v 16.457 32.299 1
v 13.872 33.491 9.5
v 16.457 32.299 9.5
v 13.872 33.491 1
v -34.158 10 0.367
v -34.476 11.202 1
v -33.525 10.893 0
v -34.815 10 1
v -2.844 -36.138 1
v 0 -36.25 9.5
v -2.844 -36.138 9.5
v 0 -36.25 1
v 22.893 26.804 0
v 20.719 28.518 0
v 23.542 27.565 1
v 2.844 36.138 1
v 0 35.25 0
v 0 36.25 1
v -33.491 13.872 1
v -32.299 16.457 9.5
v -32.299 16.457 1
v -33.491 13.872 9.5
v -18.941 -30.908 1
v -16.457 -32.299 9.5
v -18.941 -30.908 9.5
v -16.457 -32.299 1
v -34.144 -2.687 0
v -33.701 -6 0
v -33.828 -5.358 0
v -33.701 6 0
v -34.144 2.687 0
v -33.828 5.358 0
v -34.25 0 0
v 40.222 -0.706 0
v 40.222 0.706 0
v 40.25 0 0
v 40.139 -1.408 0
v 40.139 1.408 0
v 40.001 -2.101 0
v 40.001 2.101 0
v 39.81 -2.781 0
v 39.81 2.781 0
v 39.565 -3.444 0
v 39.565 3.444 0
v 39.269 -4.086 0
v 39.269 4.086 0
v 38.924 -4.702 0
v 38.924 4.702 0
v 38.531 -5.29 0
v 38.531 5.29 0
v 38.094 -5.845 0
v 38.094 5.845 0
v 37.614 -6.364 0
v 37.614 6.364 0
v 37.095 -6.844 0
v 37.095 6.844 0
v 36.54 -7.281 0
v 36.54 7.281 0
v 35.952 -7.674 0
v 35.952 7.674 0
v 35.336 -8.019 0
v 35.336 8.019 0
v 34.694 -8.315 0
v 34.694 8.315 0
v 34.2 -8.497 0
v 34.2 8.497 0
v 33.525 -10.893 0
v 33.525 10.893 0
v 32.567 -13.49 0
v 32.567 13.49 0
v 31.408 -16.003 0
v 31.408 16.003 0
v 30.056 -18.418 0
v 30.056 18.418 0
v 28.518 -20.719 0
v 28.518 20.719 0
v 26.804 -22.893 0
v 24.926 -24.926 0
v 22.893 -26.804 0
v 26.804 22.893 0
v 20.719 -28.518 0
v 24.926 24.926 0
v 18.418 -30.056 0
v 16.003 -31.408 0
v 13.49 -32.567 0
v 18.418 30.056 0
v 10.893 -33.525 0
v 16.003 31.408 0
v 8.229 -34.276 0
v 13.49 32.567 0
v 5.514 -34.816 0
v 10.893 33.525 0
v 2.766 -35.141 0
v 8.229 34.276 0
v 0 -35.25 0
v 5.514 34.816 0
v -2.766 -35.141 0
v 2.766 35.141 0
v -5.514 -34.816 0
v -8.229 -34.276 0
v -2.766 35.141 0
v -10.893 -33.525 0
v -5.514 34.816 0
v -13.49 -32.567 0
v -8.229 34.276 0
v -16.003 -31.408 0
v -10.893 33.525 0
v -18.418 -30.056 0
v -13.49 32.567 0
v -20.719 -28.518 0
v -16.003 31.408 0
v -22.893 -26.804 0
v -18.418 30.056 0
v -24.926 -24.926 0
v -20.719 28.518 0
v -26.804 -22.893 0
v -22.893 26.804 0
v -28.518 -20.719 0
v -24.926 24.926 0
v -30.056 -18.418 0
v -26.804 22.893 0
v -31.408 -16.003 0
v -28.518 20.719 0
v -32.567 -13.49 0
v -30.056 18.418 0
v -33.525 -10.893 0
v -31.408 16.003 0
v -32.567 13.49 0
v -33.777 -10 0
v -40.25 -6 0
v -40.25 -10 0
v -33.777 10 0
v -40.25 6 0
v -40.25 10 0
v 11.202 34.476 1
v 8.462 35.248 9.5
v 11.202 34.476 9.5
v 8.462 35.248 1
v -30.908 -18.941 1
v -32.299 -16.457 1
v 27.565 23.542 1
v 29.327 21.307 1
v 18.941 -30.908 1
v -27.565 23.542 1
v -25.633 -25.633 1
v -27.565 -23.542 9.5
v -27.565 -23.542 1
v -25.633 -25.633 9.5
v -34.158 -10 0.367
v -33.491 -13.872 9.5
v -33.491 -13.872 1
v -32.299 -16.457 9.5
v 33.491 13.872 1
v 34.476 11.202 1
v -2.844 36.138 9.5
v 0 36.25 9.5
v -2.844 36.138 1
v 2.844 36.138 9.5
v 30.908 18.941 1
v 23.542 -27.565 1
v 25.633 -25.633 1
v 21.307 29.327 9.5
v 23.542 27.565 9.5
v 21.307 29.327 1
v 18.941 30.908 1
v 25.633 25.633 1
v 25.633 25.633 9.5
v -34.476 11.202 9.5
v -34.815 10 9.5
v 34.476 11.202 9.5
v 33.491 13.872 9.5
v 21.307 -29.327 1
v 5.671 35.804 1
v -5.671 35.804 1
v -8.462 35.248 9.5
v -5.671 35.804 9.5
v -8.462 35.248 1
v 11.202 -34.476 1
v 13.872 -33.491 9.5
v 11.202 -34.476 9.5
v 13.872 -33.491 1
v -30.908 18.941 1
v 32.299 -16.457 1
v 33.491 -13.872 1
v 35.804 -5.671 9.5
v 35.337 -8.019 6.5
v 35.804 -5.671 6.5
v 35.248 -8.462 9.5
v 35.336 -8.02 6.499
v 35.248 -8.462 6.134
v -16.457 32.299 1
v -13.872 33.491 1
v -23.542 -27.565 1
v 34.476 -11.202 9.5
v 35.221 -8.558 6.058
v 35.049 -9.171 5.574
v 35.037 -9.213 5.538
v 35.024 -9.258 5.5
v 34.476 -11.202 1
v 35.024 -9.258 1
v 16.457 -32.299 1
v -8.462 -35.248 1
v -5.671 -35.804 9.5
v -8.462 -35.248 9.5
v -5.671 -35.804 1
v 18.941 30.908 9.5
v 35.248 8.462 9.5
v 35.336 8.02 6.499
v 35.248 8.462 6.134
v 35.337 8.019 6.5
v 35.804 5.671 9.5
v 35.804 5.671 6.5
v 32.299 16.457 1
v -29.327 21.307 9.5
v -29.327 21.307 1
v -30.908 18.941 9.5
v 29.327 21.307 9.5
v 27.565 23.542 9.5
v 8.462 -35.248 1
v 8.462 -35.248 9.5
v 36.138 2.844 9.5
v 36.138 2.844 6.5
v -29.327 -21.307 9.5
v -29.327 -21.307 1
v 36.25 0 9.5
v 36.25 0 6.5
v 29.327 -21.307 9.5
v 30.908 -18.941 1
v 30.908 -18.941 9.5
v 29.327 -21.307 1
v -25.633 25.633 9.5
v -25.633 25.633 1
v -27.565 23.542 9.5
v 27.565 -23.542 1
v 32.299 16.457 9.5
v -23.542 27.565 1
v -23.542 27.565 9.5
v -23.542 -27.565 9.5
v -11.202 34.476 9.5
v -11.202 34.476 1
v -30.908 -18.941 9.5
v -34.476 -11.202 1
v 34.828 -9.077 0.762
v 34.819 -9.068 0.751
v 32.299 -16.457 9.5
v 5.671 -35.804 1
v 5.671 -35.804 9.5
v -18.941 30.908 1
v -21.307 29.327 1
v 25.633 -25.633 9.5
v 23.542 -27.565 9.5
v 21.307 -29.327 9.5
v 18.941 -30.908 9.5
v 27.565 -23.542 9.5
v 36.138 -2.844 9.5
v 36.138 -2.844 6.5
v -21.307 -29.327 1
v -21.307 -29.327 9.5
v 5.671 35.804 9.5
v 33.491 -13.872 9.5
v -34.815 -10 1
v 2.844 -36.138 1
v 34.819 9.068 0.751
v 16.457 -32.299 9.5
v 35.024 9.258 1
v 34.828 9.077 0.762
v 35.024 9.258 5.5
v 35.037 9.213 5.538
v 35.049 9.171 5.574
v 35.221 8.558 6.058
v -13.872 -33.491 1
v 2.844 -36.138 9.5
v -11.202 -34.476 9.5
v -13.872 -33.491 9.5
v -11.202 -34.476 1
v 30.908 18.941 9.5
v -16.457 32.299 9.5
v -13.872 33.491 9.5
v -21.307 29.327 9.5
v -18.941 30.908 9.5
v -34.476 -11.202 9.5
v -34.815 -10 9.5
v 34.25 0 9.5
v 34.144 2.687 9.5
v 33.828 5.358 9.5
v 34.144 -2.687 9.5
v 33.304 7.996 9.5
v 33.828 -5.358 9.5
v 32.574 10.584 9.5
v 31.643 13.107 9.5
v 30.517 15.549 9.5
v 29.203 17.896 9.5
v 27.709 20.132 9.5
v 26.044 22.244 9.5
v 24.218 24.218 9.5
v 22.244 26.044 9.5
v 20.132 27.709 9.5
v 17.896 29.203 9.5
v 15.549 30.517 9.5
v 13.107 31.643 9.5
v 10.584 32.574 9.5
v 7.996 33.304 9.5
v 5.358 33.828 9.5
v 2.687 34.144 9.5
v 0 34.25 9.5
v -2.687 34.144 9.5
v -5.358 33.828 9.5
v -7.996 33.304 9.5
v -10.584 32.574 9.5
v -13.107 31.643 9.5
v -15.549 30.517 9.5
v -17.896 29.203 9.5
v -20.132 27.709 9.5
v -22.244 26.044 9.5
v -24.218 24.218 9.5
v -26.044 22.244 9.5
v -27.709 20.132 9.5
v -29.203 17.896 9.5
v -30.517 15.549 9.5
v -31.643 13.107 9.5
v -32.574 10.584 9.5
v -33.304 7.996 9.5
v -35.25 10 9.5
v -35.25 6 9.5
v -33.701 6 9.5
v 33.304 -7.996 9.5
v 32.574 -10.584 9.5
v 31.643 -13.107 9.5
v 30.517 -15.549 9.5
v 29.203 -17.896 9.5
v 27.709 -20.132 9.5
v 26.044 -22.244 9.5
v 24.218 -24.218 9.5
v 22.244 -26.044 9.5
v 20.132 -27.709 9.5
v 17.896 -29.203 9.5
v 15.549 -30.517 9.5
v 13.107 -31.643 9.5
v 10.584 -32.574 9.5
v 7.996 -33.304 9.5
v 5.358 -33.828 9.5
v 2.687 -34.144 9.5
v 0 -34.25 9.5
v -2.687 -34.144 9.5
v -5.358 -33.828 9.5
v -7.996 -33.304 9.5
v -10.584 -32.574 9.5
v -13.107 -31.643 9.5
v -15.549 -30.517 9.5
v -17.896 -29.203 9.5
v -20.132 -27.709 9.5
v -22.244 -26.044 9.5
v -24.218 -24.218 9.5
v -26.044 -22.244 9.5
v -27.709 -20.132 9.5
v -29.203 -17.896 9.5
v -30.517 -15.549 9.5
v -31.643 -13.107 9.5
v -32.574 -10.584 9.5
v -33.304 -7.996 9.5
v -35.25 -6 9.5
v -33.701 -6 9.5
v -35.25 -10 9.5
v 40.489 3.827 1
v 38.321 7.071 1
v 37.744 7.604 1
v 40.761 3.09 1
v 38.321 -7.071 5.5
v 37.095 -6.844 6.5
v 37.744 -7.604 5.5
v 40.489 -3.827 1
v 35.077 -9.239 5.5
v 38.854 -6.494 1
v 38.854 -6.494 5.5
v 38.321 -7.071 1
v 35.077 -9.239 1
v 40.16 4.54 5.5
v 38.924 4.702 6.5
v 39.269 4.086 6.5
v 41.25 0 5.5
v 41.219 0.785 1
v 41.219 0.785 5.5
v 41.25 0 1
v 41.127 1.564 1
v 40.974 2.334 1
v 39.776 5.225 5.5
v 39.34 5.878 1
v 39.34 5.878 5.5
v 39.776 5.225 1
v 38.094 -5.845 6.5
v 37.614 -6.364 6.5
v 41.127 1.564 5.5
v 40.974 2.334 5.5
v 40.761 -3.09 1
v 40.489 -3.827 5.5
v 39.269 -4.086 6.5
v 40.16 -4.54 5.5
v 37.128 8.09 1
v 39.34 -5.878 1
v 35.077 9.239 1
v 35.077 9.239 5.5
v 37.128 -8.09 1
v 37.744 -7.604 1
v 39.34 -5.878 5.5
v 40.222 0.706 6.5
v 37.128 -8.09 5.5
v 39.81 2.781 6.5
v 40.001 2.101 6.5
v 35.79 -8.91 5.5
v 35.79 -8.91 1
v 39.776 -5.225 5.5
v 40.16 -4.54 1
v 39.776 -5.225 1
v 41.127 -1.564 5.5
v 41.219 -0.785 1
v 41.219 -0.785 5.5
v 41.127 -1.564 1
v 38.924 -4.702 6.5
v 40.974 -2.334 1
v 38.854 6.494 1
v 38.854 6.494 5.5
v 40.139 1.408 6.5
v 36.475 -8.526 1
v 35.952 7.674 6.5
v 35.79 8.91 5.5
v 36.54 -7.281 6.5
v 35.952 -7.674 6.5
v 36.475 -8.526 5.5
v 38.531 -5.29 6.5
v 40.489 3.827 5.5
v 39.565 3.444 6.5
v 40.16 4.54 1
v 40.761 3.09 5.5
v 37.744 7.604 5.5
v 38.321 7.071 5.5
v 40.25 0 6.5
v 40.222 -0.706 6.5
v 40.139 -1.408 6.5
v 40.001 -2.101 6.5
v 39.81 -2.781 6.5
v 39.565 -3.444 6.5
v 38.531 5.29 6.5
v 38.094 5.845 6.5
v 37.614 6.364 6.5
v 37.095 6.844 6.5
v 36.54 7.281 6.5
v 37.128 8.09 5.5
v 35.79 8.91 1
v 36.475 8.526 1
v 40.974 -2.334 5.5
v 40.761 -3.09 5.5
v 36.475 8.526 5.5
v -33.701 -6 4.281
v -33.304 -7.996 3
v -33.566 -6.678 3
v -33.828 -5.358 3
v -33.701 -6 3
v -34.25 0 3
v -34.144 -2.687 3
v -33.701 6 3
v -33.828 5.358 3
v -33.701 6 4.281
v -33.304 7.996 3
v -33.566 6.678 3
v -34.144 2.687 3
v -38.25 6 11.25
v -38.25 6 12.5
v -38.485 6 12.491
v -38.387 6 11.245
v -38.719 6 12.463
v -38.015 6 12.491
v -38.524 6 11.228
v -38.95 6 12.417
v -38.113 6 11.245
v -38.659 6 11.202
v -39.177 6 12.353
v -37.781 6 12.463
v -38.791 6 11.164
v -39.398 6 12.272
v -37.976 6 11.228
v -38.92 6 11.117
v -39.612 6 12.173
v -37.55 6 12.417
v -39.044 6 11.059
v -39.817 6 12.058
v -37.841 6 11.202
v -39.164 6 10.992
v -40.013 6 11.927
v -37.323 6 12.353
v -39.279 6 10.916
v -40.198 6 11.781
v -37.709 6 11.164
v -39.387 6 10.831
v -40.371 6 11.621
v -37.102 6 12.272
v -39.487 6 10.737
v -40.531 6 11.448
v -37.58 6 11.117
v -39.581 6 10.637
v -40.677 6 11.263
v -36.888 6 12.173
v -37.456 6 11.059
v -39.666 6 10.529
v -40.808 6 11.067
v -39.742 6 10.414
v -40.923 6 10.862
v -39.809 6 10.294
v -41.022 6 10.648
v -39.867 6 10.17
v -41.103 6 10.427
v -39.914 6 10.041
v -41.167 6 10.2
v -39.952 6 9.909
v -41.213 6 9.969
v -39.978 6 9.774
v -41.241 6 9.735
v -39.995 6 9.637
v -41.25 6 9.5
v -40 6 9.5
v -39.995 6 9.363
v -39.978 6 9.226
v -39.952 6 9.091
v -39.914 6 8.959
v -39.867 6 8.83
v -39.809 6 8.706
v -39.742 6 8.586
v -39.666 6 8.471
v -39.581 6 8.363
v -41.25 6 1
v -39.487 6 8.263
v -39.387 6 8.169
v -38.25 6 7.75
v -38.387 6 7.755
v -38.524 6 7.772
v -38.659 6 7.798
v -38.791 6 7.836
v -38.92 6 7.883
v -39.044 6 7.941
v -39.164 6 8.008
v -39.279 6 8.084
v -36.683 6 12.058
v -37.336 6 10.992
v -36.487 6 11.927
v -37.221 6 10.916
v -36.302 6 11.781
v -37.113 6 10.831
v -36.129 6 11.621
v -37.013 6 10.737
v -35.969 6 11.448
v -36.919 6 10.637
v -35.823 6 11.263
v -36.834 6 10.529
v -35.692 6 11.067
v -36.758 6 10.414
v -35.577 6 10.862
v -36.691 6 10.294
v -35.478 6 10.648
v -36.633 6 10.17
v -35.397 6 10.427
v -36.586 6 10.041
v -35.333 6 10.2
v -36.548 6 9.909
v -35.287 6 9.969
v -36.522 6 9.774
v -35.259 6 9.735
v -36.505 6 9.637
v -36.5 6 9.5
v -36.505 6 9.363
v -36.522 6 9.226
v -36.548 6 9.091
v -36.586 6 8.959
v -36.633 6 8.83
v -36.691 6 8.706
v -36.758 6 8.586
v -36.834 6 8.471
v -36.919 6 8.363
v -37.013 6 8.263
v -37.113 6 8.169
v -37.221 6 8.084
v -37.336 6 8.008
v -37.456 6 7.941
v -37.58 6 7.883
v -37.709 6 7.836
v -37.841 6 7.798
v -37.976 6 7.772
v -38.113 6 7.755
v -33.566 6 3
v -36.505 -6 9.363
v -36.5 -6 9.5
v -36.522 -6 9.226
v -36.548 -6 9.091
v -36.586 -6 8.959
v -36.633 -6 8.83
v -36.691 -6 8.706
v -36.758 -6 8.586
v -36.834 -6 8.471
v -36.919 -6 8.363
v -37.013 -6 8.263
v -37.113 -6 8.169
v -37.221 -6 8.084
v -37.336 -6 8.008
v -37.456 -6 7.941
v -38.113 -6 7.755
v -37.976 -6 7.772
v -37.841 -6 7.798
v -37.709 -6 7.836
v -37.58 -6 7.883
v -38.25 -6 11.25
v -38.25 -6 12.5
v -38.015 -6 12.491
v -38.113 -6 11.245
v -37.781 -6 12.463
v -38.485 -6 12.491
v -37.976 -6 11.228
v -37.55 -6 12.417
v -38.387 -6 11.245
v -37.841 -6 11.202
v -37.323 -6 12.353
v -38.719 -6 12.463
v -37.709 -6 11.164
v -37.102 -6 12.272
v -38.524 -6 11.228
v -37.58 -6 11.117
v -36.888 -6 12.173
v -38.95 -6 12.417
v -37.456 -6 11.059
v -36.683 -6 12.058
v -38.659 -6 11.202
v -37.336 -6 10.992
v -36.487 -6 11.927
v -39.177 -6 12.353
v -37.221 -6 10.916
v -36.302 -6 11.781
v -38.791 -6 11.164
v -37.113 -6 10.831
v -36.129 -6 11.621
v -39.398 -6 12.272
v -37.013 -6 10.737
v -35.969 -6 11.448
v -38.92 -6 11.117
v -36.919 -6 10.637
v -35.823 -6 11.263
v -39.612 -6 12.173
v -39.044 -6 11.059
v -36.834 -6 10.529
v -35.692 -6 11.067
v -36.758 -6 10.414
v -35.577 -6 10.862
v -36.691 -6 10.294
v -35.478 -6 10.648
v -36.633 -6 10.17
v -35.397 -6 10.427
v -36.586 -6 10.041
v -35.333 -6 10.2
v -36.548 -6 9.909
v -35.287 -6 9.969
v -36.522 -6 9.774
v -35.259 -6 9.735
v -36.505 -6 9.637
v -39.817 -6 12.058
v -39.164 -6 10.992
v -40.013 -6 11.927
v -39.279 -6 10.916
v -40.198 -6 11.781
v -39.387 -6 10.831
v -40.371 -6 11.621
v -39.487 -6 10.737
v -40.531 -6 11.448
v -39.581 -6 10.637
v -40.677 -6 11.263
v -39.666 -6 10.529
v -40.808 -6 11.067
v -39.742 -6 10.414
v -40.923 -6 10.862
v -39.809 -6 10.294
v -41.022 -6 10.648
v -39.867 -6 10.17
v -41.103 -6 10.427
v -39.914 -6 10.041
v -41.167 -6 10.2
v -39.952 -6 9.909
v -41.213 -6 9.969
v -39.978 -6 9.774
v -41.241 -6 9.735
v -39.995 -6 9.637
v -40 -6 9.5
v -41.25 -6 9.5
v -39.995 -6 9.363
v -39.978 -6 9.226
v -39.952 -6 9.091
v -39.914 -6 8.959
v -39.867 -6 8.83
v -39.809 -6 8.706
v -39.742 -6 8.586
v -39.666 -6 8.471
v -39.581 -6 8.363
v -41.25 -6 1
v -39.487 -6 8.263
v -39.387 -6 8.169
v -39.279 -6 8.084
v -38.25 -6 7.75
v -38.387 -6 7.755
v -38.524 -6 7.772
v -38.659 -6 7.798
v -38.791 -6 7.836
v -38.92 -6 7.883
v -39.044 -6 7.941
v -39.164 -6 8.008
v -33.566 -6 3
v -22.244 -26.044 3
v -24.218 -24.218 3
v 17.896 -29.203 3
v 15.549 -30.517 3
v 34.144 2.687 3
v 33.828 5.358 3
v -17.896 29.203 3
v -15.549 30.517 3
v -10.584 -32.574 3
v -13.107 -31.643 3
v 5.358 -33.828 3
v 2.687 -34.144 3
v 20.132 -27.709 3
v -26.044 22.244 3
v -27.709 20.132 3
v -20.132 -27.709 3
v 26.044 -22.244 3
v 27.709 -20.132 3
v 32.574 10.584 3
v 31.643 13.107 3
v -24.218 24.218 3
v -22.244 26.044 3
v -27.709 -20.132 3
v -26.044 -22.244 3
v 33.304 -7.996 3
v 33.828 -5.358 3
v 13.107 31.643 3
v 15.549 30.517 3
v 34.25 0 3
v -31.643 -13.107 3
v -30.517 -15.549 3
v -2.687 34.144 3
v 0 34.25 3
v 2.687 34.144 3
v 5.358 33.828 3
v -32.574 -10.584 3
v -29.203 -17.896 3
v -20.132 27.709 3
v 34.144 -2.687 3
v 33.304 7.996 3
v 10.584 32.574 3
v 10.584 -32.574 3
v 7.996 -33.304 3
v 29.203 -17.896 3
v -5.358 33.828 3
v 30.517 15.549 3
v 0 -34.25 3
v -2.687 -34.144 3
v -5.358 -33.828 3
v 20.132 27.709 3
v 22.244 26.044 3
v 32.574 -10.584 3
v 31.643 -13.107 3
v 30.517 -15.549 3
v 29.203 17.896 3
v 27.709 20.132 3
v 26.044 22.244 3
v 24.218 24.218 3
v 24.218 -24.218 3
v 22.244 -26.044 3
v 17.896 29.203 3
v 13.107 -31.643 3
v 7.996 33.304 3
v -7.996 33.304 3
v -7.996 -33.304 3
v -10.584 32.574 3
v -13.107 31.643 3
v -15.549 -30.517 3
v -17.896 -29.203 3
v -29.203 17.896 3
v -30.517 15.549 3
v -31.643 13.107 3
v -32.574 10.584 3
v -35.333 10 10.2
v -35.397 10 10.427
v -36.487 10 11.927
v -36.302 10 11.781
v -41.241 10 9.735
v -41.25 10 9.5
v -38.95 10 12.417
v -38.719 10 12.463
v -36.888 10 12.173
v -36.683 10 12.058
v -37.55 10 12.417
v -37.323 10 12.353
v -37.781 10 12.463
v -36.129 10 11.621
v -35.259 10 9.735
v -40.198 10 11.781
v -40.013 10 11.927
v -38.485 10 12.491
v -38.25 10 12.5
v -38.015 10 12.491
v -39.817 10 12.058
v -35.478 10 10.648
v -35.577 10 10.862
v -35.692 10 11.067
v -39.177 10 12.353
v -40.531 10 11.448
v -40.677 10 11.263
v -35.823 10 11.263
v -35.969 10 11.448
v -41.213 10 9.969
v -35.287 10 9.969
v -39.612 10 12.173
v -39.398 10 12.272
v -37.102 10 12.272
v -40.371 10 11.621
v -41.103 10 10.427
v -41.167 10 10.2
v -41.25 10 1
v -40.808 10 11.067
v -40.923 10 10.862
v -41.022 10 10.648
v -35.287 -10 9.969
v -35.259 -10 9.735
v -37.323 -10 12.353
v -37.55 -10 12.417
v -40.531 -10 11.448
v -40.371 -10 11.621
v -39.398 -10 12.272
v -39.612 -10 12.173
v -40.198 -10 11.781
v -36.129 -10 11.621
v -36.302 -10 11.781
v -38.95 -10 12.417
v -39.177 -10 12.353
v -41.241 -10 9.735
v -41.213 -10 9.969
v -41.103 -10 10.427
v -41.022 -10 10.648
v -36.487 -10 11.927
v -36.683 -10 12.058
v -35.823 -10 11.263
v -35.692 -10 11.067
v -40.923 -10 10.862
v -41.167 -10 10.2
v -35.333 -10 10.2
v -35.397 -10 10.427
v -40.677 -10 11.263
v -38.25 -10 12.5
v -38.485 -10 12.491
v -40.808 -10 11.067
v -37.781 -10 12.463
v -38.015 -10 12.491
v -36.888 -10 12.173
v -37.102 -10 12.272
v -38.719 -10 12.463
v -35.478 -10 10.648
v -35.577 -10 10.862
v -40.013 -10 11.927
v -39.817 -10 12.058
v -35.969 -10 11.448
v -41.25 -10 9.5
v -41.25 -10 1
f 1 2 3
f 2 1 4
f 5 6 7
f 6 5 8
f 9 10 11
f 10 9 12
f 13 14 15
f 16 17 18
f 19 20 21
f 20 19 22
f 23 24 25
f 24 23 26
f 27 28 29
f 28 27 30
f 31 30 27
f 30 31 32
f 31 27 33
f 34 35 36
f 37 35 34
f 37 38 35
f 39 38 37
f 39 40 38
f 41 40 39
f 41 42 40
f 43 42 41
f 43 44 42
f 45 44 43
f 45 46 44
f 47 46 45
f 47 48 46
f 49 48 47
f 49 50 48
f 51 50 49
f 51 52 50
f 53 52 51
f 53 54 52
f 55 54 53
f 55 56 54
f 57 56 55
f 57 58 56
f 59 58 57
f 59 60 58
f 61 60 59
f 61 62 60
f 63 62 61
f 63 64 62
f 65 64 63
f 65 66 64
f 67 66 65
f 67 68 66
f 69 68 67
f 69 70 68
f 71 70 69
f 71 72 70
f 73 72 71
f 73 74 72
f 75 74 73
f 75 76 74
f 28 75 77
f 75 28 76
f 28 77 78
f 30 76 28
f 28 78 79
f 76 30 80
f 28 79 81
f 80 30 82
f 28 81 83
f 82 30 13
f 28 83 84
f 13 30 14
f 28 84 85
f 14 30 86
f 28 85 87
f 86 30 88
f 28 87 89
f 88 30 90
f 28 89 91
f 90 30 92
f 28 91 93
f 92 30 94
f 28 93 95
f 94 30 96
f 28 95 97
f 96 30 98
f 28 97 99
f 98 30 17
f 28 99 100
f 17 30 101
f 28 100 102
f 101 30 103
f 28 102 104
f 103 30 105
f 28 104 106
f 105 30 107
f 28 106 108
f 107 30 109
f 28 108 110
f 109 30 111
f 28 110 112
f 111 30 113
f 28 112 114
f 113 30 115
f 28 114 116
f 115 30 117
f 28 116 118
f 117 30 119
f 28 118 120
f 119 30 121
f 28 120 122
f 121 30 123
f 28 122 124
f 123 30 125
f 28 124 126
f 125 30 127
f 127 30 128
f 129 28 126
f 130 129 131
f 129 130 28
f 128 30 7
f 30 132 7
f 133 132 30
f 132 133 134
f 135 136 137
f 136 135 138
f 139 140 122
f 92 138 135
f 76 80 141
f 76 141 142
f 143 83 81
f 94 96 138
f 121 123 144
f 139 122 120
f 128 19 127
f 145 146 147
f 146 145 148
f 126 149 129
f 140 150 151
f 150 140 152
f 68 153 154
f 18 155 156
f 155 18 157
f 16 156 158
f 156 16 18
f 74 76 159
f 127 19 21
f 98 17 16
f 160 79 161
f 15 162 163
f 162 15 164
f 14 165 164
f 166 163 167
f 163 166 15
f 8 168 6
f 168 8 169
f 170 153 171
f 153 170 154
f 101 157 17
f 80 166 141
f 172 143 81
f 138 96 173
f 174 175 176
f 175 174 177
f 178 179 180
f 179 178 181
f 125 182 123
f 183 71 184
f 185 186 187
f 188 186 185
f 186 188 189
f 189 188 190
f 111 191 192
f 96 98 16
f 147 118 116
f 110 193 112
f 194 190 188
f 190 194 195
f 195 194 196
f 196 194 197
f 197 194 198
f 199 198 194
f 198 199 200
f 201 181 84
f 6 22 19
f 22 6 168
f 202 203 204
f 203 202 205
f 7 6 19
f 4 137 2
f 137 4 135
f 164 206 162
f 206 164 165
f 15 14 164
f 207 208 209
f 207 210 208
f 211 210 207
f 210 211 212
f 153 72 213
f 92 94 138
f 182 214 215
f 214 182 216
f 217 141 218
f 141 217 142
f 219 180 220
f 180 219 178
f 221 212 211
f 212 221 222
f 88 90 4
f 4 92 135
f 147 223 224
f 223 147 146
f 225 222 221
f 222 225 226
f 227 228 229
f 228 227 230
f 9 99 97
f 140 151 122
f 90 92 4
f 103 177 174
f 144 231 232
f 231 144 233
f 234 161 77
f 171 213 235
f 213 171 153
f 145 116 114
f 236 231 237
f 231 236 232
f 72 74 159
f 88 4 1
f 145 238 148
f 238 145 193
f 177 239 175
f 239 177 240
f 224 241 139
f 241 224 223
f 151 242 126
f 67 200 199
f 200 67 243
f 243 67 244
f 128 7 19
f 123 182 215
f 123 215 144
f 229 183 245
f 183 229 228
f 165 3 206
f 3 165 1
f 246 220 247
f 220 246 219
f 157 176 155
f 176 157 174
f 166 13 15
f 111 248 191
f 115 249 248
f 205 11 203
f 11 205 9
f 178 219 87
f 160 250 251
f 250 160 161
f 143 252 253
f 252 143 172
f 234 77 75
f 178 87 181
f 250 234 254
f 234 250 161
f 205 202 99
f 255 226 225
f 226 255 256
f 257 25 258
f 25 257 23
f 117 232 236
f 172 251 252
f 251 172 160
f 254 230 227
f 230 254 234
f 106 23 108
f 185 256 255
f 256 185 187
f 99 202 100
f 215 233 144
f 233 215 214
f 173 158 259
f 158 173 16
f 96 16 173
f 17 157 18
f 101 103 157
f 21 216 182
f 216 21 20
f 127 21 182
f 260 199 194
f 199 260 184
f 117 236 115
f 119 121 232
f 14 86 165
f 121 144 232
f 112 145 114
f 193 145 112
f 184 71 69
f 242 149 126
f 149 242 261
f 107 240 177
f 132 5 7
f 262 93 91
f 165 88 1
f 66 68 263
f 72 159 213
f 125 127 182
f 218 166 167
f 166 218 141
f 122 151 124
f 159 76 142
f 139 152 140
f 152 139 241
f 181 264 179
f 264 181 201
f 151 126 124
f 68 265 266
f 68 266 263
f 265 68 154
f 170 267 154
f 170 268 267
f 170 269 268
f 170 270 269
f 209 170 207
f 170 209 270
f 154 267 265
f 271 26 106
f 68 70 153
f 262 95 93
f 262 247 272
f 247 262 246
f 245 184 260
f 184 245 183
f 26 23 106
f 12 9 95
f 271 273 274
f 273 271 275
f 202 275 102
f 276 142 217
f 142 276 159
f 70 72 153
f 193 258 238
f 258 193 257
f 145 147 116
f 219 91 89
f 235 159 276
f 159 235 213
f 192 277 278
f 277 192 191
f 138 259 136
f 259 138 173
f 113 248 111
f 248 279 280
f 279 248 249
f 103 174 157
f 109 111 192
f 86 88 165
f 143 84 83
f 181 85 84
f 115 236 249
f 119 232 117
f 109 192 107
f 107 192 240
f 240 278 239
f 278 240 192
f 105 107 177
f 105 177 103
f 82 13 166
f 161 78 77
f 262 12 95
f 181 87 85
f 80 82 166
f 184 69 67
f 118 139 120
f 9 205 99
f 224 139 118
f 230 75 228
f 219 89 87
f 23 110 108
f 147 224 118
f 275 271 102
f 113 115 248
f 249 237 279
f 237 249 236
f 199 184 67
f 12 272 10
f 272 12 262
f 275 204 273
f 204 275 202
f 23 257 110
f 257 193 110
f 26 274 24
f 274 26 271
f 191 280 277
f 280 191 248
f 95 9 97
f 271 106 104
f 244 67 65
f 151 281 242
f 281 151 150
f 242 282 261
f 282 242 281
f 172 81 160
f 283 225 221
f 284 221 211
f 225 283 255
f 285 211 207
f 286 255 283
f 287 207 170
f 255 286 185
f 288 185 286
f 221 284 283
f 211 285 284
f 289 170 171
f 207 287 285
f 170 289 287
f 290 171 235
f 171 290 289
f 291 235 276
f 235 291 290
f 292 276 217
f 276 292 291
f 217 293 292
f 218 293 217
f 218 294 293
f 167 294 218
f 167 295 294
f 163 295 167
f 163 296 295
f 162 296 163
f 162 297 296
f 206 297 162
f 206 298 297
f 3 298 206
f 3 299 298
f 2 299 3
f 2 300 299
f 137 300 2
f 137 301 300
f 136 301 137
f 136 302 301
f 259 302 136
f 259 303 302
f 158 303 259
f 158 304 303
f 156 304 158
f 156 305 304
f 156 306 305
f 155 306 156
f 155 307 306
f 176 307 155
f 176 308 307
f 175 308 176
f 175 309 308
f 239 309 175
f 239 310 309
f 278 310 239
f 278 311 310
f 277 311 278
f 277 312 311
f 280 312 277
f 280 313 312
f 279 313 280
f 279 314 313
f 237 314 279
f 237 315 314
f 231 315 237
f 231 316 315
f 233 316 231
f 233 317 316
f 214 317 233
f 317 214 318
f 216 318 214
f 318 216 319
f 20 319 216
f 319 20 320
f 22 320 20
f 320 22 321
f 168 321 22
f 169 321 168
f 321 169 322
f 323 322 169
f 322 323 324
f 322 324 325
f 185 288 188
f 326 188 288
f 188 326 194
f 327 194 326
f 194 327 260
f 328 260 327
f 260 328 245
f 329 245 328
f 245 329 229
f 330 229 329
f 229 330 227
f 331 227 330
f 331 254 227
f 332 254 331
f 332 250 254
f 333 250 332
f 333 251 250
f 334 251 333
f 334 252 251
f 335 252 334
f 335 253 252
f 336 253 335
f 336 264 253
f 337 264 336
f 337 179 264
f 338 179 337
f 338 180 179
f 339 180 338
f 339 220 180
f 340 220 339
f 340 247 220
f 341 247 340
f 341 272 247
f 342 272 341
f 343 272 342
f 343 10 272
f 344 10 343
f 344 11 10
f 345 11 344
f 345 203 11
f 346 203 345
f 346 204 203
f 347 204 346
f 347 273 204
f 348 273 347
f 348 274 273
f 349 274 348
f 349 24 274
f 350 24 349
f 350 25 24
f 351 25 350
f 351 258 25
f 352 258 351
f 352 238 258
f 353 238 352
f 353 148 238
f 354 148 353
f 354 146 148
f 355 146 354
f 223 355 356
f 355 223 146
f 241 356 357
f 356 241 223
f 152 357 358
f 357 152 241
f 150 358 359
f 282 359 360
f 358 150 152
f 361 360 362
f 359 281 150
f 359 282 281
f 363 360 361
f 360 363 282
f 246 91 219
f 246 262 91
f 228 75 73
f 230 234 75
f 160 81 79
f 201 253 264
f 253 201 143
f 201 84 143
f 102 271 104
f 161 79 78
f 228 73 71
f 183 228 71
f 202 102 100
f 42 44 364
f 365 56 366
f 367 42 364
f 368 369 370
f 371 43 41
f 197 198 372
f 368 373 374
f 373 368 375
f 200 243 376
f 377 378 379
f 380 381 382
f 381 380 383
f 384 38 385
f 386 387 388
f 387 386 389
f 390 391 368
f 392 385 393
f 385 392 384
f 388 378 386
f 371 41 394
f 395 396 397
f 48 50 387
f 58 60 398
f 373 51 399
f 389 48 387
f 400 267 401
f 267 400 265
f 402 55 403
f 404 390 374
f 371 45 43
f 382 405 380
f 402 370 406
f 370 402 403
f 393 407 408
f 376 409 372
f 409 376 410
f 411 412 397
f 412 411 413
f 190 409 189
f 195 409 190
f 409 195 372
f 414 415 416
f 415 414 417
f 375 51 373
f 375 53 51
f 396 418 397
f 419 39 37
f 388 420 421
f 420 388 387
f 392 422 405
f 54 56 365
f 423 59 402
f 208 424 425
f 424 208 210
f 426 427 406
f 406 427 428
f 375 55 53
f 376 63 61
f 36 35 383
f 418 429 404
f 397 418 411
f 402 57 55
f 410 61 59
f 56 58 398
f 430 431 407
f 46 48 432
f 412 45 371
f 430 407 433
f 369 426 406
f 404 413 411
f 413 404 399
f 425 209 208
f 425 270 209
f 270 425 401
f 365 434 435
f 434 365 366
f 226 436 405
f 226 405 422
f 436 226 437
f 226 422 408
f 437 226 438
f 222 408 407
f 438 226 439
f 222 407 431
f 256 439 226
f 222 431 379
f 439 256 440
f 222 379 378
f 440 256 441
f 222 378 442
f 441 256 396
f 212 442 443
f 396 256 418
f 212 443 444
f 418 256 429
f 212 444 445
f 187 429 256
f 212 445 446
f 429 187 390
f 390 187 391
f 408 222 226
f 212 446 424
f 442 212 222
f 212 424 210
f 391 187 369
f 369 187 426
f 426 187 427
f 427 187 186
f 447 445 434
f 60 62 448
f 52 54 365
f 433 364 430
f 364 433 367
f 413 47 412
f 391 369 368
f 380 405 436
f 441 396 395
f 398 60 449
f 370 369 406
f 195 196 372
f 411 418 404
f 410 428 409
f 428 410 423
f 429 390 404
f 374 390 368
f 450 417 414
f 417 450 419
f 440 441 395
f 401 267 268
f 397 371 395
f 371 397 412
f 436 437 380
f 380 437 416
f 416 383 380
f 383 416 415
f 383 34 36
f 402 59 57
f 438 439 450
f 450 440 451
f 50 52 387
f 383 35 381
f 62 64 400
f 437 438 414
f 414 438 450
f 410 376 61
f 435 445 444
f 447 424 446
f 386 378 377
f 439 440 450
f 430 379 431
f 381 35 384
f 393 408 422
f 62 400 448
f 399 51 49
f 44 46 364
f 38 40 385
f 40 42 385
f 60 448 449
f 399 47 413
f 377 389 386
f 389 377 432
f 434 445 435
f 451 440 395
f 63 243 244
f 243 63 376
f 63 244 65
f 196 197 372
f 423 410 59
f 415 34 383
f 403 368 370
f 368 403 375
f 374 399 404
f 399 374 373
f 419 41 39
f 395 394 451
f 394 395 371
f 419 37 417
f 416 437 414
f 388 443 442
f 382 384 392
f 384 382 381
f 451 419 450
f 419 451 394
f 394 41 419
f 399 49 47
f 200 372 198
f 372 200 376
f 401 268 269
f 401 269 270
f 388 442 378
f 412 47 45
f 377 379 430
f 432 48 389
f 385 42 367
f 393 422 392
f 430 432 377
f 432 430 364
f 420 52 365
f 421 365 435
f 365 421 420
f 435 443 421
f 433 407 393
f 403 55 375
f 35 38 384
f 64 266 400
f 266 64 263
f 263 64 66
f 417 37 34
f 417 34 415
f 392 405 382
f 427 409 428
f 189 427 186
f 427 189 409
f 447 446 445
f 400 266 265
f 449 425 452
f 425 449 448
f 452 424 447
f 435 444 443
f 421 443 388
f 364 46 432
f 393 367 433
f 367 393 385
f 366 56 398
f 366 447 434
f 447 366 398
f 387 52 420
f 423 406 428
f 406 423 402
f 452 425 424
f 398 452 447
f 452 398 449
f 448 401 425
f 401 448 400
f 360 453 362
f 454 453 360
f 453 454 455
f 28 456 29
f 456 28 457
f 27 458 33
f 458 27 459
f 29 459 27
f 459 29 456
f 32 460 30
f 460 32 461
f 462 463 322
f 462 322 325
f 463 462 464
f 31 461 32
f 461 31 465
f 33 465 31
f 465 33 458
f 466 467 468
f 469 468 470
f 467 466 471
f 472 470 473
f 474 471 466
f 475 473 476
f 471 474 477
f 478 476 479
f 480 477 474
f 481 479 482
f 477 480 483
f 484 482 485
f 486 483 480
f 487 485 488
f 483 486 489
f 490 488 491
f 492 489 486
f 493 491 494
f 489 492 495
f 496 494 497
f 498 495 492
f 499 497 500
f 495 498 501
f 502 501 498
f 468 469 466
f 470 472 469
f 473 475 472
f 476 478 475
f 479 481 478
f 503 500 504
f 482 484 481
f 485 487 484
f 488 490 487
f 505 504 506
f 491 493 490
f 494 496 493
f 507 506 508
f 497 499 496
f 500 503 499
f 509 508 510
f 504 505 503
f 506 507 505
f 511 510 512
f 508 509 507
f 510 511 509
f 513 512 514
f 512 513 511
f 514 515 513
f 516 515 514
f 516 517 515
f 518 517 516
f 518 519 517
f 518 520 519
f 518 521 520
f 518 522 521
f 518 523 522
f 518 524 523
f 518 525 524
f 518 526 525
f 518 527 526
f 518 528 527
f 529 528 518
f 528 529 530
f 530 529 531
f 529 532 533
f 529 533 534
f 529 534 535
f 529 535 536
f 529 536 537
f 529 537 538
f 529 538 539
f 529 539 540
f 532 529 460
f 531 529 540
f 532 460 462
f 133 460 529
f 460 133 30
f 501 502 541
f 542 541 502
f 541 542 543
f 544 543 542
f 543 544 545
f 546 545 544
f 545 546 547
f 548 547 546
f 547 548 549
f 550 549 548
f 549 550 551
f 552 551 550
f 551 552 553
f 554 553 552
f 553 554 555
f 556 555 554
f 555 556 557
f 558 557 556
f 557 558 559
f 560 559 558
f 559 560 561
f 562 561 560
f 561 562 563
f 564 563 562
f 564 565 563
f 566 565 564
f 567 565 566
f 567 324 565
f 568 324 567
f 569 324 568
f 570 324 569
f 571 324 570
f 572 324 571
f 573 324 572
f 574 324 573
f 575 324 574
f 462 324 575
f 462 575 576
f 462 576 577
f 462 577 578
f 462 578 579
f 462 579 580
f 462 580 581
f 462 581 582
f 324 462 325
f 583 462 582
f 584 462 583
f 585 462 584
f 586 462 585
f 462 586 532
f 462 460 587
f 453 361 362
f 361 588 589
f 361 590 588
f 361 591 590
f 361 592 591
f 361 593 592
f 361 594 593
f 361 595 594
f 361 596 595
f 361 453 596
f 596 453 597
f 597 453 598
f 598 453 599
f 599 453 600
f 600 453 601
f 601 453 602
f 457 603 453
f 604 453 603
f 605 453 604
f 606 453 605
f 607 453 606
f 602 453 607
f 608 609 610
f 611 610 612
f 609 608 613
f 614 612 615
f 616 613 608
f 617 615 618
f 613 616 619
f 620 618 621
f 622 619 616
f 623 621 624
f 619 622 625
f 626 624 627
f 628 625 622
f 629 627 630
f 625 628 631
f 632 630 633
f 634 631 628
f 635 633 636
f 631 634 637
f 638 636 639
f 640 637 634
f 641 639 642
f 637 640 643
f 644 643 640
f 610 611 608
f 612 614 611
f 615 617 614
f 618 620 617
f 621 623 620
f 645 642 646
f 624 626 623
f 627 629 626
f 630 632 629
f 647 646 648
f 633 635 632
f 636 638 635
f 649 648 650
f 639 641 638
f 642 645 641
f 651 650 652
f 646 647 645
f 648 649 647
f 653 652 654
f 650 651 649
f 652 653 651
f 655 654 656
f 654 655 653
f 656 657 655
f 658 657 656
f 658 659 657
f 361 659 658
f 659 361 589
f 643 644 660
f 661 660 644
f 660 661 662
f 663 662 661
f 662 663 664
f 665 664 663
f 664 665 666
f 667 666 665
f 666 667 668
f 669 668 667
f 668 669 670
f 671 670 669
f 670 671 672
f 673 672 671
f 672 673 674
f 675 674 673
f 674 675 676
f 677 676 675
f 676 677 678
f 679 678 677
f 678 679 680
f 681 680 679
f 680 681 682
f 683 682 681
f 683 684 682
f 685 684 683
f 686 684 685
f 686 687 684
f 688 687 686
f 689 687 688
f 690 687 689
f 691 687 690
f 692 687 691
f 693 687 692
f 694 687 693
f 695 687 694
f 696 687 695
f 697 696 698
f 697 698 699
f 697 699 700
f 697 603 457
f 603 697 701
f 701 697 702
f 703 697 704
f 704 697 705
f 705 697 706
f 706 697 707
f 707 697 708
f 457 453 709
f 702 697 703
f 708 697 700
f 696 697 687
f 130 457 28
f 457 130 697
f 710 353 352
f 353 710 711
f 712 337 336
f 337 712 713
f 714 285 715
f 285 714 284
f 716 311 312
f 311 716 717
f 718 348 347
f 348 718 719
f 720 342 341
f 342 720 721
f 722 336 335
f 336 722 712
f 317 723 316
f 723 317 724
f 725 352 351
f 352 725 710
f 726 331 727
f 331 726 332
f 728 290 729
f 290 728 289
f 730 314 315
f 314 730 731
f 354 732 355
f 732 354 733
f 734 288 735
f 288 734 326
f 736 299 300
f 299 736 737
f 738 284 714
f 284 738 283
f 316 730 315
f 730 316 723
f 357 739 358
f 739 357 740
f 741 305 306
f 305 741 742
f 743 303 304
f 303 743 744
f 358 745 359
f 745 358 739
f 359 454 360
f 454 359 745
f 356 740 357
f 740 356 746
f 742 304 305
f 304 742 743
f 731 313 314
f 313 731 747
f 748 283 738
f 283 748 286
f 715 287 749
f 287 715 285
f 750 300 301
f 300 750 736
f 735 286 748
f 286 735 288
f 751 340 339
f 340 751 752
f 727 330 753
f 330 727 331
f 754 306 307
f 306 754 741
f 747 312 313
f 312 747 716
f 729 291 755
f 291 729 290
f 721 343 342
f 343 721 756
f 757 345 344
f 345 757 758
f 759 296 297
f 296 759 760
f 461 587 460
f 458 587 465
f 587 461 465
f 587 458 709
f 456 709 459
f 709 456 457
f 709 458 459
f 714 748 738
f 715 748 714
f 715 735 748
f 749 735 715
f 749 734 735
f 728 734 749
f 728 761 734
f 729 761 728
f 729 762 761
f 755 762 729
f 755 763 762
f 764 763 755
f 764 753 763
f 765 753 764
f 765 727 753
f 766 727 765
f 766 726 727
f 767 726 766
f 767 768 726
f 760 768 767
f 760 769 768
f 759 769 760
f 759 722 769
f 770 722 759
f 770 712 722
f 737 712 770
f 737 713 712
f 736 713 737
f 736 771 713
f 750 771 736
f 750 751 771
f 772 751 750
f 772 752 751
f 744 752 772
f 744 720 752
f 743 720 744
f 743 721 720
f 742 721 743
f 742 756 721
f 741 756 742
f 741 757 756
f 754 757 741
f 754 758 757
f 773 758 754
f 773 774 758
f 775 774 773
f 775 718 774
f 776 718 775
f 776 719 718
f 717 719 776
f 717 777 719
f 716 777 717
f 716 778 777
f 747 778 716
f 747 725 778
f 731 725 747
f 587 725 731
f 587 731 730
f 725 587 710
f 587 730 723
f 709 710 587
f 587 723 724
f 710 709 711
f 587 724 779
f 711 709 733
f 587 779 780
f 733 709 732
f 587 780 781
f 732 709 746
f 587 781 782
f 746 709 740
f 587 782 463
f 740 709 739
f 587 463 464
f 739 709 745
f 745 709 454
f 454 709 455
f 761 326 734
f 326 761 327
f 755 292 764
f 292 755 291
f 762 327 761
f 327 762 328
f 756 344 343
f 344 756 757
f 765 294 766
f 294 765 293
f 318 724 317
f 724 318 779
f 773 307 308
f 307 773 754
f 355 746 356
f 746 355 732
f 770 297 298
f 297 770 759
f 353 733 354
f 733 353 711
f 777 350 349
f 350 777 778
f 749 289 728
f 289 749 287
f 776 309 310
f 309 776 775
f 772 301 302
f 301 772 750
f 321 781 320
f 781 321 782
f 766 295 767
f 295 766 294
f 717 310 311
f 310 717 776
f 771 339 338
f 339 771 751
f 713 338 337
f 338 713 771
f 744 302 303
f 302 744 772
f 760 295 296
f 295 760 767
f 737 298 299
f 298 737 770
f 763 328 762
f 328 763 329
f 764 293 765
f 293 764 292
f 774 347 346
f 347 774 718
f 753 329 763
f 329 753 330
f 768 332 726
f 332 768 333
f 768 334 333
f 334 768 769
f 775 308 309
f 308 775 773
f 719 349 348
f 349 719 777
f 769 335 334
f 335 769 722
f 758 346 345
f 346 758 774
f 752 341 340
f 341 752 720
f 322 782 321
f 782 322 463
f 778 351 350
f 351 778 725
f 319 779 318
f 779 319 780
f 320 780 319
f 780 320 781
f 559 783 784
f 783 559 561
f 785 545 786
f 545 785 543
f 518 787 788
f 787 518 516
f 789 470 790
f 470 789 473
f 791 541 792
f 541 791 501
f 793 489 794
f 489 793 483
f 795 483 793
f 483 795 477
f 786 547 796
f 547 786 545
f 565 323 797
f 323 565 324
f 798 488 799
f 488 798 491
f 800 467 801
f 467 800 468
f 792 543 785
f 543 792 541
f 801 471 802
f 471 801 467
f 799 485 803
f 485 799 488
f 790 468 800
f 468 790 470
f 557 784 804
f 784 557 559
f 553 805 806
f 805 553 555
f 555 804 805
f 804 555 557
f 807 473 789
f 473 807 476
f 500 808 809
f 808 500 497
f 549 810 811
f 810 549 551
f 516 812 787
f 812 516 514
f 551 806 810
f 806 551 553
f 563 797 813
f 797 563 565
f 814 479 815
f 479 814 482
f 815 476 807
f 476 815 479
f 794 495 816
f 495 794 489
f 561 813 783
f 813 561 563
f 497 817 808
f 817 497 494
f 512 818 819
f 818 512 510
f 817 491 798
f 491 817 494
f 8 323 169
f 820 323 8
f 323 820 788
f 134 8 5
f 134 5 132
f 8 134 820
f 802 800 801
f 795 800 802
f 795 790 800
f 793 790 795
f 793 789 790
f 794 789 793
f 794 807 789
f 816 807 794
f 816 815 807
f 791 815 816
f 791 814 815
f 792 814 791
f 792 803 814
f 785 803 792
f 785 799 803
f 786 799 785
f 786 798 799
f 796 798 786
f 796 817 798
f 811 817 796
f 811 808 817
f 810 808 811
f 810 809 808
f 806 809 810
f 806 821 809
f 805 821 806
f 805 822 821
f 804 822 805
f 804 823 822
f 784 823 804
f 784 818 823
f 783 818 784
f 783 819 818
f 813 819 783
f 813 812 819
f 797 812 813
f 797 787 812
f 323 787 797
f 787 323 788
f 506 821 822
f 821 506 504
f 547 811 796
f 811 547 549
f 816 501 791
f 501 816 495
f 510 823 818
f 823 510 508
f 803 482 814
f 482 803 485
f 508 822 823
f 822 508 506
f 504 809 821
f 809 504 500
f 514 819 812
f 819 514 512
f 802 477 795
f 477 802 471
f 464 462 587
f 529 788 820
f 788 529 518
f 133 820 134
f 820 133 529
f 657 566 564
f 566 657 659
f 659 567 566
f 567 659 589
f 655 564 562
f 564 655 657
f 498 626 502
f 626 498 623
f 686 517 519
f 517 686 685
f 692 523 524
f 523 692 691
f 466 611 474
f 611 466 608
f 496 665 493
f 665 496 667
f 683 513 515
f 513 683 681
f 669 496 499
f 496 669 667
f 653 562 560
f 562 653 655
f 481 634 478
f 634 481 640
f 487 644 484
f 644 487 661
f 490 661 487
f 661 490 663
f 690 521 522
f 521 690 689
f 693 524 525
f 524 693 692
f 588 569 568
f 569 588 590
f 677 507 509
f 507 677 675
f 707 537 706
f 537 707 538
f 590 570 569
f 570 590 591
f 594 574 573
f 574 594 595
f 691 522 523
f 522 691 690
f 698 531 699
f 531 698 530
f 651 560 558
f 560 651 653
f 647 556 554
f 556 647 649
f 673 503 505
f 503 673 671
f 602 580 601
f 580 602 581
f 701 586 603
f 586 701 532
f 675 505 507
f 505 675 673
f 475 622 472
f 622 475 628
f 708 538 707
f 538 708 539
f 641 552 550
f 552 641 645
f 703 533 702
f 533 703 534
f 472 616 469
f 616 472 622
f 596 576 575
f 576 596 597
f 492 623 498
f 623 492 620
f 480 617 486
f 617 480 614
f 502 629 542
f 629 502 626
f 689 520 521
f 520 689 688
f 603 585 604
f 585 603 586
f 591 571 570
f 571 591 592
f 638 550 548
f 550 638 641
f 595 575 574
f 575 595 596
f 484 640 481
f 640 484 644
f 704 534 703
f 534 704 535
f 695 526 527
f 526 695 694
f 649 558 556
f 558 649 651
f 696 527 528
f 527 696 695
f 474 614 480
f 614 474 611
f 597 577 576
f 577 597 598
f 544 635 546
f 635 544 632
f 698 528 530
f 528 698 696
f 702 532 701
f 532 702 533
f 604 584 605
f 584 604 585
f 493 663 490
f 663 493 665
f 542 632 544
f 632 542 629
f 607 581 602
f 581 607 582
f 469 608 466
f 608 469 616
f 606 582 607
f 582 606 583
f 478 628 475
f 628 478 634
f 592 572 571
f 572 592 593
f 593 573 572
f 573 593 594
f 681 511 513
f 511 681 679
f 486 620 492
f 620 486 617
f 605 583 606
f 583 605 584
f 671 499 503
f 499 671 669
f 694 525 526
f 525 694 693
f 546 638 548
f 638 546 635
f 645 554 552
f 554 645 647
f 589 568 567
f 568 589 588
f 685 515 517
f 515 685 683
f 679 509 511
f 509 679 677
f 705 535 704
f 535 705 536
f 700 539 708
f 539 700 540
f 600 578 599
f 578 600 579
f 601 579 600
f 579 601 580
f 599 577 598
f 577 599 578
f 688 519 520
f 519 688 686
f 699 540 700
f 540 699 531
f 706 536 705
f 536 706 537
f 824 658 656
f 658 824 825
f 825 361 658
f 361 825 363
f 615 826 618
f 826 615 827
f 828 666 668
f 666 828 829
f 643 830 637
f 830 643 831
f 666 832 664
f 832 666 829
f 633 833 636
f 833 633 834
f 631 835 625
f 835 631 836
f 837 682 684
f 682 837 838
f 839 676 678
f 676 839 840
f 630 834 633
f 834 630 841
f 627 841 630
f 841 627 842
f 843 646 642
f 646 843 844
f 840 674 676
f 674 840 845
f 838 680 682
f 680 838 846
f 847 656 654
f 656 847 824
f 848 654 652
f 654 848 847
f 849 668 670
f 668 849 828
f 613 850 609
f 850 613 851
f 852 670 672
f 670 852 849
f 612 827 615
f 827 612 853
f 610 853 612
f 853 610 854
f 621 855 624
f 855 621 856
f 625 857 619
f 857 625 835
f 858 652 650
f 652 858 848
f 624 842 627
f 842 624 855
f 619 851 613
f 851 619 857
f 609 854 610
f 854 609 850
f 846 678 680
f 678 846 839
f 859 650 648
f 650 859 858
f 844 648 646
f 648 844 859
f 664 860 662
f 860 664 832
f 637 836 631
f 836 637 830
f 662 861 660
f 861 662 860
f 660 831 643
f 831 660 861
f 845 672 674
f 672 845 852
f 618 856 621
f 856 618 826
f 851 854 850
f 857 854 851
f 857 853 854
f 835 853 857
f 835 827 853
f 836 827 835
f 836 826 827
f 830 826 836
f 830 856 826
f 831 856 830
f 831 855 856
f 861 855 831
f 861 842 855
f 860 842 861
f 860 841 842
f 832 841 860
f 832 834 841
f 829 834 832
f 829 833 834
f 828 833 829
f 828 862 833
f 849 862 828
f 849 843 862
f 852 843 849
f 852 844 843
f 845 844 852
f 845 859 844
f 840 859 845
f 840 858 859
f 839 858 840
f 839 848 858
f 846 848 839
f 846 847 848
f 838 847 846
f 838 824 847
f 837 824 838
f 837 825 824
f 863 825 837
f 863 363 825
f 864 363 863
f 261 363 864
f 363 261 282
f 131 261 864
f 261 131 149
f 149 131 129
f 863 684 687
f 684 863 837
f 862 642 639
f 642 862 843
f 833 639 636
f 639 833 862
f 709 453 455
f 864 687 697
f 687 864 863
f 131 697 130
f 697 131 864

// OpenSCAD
/* parametricCap.scad
Author: andimoto@posteo.de
----------------------------
*/
$fn=80;
flatness = 0.00001;

diaInner = 68.5;
hInner = 6.5;
wallThickness = 2;
champferDiff = 1;

diaFingerCone1 = 10;
fingerConeXMove = -3;

innerHingeSpace = 12;

hingePlateWidth = 7;
hingePlateThickness = wallThickness*2;
hingePlateR = 3;  //this can also be half hingePlateWidth

hingeExtraMove = 0;

hingeTubeDia = 3.5;

module cap()
{
  difference()
  {
    union()
    {
      hull()
      {
        translate([0,0,0]) cylinder(r=-champferDiff+wallThickness+diaInner/2,h=flatness);
        translate([0,0,champferDiff]) cylinder(r=wallThickness+diaInner/2,h=hInner+wallThickness);
      }
      translate([(diaInner/2)+fingerConeXMove,0,0]) fingerGrip();
    }
    translate([0,0,wallThickness+champferDiff]) cylinder(r=diaInner/2,h=hInner);

    difference()
    {
      /* hinge cutout from wall */
      cylinder(r=wallThickness+diaInner/2,h=hInner+wallThickness+champferDiff);
      cylinder(r=diaInner/2,h=hInner+wallThickness+champferDiff);
      translate([-(diaInner+wallThickness*2)/2,innerHingeSpace/2,0])
        cube([diaInner+wallThickness*2,(diaInner+wallThickness)/2,hInner+wallThickness+champferDiff]);
      translate([-(diaInner+wallThickness*2)/2,-(innerHingeSpace/2+(diaInner+wallThickness)/2),0])
        cube([diaInner+wallThickness*2,(diaInner+wallThickness)/2,hInner+wallThickness+champferDiff]);
      translate([(diaInner/2+wallThickness*2)/2,-(diaInner/2+wallThickness)/2,0])
        cube([diaInner/2+wallThickness*2,(diaInner+wallThickness)/2,hInner+wallThickness+champferDiff]);
    }
  }

  translate([-(diaInner/2+hingePlateWidth+hingeExtraMove),innerHingeSpace/2,0])
    hingePlate(true);
  translate([-(diaInner/2+hingePlateWidth+hingeExtraMove),-(hingePlateThickness+innerHingeSpace/2),0])
    hingePlate();


}

cap();

module hingePlate(hingeTube = false)
{
  translate([hingePlateR,hingePlateThickness,hInner+wallThickness+champferDiff])
    rotate([90,0,0]) cylinder(r=hingePlateR,h=hingePlateThickness);
  hull()
  {
    translate([champferDiff,0,0])
      cube([hingePlateWidth-champferDiff+wallThickness/2,hingePlateThickness,flatness]);
    translate([0,0,champferDiff])
      cube([hingePlateWidth,hingePlateThickness,hInner+wallThickness]);
  }
  if(hingeTube == true)
  {
    translate([hingePlateR,0,hInner+wallThickness+champferDiff])
    rotate([90,0,0]) cylinder(r=hingeTubeDia/2,h=innerHingeSpace);
  }
}
/* hingePlate(true); */

module fingerGrip()
{
  hull()
  {
    cylinder(r=diaFingerCone1-champferDiff,h=flatness);
    translate([0,0,champferDiff]) cylinder(r=diaFingerCone1,h=hInner-2);
    translate([0,0,champferDiff*2+hInner-2]) cylinder(r=diaFingerCone1-champferDiff,h=flatness);
  }
}

/* fingerGrip(); */
